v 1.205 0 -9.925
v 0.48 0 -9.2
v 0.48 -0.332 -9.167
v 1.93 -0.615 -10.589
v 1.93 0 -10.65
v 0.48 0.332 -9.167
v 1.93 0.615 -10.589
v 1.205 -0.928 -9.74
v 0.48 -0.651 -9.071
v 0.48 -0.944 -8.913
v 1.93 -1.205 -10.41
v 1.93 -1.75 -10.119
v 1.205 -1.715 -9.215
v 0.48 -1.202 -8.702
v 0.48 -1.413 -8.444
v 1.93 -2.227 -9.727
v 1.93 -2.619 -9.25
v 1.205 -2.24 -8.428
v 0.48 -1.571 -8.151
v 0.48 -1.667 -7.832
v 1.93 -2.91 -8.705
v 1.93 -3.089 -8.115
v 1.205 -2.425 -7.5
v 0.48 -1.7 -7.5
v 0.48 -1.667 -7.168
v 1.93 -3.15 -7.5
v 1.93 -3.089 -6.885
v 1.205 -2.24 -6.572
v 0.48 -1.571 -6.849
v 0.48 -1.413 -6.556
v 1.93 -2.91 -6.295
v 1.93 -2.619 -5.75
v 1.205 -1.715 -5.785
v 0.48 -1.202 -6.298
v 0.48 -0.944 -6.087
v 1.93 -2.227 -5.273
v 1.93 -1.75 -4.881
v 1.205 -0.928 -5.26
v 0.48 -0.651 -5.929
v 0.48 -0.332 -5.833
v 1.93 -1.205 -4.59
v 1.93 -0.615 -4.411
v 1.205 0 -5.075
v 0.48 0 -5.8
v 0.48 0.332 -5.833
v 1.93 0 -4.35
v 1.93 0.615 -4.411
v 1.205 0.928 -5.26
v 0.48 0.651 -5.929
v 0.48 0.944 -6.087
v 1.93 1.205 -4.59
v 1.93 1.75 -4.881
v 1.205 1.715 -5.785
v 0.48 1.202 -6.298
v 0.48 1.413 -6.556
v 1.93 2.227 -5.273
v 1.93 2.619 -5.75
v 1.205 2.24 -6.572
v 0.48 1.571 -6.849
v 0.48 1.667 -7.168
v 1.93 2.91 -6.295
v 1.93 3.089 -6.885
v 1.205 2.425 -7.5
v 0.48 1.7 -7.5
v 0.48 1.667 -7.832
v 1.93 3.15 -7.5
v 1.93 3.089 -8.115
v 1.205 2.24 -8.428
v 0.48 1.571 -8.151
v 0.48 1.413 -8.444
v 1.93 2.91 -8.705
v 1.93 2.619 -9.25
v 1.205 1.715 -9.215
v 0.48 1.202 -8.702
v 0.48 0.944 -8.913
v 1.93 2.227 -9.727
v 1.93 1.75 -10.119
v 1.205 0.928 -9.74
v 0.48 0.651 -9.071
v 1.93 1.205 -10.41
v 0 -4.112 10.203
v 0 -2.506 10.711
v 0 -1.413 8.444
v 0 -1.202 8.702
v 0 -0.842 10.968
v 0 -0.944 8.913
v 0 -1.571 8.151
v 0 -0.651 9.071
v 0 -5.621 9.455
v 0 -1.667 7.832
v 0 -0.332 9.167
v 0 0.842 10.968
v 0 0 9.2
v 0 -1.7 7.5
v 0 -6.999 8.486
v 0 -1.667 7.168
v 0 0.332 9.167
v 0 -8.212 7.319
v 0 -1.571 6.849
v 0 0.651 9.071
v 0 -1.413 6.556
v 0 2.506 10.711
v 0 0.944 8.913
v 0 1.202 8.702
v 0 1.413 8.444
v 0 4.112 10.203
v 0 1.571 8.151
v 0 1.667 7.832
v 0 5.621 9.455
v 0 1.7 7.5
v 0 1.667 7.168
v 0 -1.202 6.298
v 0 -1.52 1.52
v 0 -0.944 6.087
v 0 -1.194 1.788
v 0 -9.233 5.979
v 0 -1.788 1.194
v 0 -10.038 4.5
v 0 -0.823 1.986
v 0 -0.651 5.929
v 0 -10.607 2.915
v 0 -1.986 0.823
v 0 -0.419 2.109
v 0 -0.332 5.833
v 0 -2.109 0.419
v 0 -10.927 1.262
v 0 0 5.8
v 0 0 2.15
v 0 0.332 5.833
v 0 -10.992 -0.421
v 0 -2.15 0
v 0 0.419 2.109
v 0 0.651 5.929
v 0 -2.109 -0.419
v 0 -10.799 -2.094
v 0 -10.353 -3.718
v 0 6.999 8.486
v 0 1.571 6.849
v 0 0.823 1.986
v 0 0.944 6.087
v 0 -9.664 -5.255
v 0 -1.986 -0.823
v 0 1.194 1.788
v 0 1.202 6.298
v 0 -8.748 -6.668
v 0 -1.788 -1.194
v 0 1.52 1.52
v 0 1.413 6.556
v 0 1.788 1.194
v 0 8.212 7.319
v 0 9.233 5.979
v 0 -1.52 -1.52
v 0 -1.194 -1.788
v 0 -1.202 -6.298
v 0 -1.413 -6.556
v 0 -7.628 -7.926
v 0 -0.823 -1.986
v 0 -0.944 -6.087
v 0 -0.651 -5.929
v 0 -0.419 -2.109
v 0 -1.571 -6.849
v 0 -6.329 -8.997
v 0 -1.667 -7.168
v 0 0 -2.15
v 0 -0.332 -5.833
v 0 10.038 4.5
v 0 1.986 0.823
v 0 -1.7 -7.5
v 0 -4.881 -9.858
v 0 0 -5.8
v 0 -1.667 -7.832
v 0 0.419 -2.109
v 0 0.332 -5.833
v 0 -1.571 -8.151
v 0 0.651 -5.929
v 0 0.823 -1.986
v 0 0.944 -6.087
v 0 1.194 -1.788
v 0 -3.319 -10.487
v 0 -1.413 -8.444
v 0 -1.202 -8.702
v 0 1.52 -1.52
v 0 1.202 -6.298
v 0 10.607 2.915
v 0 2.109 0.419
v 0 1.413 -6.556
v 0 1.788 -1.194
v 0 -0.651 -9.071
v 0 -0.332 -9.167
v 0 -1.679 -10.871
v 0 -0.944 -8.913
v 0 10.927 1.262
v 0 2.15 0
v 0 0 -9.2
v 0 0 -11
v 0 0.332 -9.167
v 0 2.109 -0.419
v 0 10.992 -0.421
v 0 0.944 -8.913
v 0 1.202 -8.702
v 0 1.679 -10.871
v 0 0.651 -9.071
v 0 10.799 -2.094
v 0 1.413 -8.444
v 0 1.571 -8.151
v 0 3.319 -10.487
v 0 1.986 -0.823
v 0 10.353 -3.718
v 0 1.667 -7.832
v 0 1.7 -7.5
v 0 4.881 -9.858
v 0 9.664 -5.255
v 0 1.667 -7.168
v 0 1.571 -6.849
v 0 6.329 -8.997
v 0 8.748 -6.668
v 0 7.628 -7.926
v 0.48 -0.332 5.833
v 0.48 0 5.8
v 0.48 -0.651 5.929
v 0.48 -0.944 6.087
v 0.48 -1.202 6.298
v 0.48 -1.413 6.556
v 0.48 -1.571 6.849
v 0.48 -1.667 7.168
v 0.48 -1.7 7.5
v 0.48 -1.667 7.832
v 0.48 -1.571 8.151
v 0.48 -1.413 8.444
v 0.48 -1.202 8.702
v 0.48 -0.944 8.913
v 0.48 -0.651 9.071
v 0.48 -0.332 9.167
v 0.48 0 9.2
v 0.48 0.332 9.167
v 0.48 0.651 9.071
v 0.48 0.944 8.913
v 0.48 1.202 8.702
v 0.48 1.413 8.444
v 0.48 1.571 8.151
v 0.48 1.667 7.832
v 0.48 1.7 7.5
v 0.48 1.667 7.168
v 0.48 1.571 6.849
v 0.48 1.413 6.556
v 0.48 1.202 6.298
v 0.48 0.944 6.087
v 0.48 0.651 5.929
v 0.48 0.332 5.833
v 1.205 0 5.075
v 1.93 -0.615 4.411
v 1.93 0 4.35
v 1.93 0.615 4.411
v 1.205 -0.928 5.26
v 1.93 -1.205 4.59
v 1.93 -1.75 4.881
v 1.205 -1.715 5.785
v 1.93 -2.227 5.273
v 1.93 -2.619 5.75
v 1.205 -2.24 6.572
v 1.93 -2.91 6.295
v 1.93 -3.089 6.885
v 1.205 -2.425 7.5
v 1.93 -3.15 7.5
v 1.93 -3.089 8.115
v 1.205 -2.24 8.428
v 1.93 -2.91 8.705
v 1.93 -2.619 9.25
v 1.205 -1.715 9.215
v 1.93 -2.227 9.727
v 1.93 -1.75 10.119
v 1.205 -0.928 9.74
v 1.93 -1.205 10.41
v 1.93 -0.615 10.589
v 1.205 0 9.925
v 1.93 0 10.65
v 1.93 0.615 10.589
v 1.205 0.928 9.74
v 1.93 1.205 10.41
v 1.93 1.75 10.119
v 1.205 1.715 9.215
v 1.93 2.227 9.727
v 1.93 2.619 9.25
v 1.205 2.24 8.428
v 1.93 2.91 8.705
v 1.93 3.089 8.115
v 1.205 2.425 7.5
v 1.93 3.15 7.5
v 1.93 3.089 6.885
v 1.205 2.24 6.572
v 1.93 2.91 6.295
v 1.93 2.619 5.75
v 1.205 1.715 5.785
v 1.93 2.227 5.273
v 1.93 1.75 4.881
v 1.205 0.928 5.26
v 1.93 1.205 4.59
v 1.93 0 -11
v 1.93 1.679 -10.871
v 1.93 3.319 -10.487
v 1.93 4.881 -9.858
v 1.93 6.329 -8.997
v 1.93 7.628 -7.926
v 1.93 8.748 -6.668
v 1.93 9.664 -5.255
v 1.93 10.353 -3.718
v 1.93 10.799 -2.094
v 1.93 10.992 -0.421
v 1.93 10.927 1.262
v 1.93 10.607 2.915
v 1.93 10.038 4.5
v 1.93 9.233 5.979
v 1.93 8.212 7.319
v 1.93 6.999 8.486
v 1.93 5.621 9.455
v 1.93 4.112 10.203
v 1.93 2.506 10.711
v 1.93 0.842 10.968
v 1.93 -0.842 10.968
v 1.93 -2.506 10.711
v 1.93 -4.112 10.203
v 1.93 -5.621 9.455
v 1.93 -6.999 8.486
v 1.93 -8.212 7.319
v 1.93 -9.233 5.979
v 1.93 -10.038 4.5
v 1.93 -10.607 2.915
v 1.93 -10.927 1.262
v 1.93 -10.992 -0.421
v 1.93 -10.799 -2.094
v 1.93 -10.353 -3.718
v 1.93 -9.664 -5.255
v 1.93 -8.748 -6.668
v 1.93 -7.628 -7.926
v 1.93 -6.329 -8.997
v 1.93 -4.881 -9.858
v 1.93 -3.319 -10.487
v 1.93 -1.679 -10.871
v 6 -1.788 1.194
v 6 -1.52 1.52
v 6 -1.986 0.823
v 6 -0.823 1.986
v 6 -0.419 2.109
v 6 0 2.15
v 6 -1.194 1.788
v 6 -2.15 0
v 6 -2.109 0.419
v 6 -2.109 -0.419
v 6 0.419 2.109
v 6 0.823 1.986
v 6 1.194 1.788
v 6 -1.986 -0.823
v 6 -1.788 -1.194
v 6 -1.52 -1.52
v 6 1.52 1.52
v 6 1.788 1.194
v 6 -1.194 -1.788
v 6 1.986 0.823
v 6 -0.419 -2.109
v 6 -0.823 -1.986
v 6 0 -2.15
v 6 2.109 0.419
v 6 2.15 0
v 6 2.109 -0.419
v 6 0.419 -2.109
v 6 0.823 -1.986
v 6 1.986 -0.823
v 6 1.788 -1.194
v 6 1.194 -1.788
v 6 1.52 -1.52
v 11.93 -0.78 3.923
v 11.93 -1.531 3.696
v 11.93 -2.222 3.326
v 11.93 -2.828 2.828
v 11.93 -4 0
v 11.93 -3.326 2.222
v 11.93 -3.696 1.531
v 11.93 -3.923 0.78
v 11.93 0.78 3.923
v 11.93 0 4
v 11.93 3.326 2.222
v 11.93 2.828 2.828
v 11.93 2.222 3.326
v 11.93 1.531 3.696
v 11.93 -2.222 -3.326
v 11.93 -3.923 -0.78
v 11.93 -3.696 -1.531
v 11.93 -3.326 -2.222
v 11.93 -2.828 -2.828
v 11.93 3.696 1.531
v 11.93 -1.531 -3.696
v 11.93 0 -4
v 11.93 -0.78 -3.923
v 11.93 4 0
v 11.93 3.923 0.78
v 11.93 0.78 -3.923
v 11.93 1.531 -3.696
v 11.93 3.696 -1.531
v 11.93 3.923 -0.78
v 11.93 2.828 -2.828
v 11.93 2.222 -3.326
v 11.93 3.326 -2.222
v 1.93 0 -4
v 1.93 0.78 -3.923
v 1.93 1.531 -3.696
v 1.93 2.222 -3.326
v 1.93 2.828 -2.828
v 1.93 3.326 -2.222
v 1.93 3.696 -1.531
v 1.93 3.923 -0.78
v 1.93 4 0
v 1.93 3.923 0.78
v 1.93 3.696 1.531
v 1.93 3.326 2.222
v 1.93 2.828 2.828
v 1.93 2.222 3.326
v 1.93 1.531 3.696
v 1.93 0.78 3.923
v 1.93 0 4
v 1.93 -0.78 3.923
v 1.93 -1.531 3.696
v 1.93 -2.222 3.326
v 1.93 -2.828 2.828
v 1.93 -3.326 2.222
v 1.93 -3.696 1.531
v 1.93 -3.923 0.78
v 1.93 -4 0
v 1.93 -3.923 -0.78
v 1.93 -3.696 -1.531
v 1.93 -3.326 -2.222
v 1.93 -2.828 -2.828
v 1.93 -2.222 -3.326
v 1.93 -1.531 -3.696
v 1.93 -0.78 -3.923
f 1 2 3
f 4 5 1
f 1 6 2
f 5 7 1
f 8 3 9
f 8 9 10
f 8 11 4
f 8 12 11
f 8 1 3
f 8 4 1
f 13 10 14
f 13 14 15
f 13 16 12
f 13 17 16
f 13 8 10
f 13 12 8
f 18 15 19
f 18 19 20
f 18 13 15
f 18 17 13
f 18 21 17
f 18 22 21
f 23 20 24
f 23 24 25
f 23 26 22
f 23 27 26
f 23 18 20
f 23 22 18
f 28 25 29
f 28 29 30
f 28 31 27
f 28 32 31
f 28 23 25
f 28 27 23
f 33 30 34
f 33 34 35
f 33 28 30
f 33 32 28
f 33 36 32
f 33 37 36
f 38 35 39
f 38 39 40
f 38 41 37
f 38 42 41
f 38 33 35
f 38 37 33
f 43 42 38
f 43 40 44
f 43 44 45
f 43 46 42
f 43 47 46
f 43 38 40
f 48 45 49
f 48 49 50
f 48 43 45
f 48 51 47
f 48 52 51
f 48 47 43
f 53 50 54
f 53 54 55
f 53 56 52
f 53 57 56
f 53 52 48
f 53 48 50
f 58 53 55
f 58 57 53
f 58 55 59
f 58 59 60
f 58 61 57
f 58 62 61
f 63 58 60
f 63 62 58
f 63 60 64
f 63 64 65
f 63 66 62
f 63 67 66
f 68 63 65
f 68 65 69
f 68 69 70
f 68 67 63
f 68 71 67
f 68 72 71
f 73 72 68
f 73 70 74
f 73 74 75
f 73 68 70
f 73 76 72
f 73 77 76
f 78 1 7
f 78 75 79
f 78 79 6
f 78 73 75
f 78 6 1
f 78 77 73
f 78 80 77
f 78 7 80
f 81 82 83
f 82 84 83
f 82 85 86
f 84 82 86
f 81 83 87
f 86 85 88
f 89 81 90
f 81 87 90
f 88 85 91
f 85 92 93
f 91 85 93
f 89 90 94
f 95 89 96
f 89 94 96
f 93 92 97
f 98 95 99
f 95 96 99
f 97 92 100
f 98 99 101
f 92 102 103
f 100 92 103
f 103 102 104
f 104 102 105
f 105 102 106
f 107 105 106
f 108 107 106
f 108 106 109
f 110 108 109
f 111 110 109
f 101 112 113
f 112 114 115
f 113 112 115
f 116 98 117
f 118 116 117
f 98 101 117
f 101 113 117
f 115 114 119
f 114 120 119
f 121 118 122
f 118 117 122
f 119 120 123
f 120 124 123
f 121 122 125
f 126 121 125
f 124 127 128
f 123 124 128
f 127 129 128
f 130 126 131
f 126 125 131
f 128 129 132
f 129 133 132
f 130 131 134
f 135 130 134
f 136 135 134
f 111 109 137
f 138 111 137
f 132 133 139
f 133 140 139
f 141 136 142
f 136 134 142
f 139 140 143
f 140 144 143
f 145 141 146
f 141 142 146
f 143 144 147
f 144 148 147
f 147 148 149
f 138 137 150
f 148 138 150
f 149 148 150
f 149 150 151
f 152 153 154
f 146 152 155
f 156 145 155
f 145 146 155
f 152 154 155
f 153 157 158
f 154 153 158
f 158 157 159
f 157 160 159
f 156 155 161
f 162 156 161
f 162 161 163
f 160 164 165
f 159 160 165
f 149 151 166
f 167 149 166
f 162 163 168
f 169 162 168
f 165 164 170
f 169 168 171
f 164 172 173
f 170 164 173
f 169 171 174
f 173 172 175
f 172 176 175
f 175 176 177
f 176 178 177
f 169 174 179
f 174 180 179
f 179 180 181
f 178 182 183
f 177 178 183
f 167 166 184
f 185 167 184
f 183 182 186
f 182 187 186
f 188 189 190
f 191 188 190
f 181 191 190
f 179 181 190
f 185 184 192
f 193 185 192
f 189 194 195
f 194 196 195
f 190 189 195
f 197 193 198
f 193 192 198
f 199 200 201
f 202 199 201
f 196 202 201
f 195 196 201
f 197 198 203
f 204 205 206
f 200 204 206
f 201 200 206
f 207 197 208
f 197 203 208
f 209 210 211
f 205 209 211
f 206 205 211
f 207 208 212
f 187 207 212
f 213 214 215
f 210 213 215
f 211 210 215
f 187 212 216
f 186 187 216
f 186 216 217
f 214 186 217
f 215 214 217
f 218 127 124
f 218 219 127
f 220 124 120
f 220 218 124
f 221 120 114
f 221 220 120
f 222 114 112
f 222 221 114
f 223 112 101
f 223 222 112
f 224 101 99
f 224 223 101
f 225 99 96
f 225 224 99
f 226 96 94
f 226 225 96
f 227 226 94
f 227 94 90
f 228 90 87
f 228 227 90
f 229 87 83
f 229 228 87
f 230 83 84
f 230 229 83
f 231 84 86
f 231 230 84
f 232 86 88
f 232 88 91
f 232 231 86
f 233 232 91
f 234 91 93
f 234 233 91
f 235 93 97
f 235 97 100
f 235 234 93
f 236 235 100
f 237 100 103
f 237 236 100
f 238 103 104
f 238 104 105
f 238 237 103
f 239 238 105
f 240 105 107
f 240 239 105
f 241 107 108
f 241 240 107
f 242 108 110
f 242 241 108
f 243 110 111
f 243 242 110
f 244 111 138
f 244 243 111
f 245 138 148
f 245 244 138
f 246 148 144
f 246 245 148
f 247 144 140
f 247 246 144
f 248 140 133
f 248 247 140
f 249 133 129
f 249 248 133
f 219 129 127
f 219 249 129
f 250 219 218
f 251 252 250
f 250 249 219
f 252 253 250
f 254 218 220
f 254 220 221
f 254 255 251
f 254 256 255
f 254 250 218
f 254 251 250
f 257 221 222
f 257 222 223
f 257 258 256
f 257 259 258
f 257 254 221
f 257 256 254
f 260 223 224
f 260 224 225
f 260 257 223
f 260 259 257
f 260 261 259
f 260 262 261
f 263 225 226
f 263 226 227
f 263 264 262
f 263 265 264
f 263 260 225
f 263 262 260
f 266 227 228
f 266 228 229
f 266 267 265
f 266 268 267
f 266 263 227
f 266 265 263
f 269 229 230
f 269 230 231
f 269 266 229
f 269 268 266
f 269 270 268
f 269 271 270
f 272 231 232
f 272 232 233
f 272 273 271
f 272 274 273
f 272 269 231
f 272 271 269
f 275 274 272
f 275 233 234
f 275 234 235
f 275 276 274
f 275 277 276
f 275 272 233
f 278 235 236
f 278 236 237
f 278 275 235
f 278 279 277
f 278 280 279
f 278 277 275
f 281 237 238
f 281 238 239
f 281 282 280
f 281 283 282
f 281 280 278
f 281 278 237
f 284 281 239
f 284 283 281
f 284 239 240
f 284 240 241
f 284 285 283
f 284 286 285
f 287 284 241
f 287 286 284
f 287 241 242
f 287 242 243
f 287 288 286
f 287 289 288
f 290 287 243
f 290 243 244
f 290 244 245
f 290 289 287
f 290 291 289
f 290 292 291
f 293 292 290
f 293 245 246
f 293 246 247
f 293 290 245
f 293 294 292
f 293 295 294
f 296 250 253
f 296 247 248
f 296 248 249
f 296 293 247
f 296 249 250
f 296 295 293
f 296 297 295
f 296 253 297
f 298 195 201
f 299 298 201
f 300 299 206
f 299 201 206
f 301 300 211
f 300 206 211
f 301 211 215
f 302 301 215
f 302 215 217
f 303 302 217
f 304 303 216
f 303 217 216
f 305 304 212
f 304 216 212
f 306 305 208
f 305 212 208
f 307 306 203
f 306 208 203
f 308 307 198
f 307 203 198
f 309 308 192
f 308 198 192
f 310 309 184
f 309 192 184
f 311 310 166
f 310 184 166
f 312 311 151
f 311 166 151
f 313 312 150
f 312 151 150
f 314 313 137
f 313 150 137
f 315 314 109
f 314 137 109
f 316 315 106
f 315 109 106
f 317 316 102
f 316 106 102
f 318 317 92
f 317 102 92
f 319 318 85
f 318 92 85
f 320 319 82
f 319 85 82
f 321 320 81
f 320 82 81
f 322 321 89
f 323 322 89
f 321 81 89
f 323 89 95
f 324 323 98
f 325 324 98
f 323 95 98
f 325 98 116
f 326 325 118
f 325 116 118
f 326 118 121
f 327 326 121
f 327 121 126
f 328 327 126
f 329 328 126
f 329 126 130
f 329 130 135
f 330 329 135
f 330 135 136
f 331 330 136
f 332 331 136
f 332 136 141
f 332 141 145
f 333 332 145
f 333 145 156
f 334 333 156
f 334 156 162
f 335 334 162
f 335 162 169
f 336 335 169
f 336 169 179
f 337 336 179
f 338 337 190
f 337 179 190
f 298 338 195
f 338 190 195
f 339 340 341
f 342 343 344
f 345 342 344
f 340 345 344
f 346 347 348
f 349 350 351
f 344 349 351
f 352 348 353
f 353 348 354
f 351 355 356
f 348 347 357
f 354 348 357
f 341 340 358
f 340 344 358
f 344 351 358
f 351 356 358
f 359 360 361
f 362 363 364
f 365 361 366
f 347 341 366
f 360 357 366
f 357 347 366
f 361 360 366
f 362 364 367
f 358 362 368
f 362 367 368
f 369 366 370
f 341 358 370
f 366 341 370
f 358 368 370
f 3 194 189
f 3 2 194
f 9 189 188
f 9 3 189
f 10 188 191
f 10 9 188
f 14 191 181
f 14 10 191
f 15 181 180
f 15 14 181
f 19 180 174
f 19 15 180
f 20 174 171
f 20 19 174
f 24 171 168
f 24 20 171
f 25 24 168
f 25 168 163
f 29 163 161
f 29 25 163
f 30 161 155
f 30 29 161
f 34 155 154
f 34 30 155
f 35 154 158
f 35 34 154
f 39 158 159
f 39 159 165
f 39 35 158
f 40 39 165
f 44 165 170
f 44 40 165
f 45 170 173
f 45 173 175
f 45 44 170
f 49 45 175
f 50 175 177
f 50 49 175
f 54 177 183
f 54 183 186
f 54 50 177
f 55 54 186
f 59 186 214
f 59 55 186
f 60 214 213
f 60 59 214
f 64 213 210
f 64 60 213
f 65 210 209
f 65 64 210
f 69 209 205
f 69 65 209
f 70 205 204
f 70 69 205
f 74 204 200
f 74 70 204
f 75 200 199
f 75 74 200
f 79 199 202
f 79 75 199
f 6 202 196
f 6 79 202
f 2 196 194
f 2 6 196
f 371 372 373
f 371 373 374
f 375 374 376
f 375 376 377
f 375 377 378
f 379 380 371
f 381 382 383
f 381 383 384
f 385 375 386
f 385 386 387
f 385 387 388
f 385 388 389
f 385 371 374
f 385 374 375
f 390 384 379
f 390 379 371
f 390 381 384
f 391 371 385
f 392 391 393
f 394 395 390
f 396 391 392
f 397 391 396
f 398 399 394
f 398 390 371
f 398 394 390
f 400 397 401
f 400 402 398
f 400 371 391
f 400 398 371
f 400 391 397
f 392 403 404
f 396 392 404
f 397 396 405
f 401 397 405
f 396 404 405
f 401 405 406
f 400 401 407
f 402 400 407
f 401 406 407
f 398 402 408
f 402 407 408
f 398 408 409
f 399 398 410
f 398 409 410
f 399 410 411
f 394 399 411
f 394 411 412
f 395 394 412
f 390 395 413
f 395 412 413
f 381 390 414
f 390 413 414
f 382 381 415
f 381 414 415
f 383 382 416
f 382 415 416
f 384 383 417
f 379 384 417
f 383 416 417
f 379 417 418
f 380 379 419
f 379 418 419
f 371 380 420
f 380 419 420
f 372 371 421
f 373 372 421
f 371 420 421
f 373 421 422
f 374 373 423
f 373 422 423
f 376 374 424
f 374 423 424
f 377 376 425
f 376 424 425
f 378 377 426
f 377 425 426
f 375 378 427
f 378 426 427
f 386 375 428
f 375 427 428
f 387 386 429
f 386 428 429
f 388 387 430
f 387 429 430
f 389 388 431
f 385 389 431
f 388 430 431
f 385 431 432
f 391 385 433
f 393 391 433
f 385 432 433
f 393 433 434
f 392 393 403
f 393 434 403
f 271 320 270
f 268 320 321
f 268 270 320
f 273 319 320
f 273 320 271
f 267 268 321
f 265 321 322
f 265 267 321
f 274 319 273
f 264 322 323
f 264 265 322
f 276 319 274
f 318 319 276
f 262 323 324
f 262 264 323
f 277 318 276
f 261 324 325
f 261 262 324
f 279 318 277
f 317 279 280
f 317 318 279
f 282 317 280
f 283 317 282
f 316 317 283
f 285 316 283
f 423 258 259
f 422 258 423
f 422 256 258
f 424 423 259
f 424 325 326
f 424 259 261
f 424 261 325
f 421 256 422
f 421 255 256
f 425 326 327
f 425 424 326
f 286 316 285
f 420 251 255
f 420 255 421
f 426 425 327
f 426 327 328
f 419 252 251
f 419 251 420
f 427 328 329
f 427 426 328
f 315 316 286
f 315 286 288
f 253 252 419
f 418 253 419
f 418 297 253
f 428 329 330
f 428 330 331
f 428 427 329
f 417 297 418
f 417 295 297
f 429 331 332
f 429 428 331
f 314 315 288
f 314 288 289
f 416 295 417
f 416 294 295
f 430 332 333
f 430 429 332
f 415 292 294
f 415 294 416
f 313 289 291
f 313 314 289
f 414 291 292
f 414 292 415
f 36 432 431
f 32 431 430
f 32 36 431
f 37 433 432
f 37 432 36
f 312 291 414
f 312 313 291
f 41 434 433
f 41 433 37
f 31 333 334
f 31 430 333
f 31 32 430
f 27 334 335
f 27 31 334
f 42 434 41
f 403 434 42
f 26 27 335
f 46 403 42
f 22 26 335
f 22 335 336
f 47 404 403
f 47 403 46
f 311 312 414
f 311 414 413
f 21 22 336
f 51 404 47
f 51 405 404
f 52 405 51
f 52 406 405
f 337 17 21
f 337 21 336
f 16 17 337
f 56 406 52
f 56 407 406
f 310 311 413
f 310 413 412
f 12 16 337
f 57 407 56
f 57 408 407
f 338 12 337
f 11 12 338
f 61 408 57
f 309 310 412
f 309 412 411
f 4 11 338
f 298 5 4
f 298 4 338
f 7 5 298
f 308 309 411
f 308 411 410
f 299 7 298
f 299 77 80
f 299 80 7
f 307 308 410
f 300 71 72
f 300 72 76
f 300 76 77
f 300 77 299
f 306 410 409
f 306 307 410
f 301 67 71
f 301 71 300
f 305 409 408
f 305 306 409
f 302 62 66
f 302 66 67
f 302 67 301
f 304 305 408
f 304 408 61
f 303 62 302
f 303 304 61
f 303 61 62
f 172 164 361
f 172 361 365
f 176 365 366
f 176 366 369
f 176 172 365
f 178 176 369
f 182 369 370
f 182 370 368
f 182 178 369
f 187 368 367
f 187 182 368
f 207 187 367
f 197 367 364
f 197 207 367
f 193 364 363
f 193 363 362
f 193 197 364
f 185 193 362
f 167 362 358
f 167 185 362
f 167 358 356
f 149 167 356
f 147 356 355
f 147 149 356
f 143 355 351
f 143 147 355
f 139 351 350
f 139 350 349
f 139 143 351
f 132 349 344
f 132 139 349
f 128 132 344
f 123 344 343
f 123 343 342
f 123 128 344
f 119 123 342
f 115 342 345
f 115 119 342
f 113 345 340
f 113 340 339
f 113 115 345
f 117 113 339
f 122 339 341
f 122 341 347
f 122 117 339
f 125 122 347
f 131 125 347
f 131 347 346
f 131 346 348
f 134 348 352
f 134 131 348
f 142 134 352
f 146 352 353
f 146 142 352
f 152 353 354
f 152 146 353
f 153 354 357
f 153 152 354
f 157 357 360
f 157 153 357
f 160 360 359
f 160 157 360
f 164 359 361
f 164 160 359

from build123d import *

# Parameters (mm, degrees)
SKETCH1_R                                      = 11
SKETCH1_R_2                                    = 1.6
BOSS_EXTRUDE1_DEPTH                            = 1.93
SKETCH2_R                                      = 4
BOSS_EXTRUDE2_DEPTH                            = 10
SKETCH3_R                                      = 2.15
CUT_EXTRUDE1_DEPTH                             = 6
CSK_FOR_M3_FLAT_HEAD_MACHINE_SCREW1_AT_2_COUNT = 2
CSK_FOR_M3_FLAT_HEAD_MACHINE_SCREW1_AT_2_PITCH = 15


with BuildPart() as part:
    # Sketch1 → Boss-Extrude1 (new body)
    with BuildSketch(Plane(origin=(0, 0, 0), x_dir=(0, 0, -1), z_dir=(1, 0, 0))):
        Circle(SKETCH1_R)
        with Locations((7.5, 0)):
            Circle(SKETCH1_R_2, mode=Mode.SUBTRACT)
        with Locations((-7.5, 0)):
            Circle(SKETCH1_R_2, mode=Mode.SUBTRACT)
    extrude(amount=BOSS_EXTRUDE1_DEPTH)

    # Sketch2 → Boss-Extrude2 (add)
    with BuildSketch(Plane(origin=(1.93, 0, 0), x_dir=(0, 0, -1), z_dir=(1, 0, 0))):
        Circle(SKETCH2_R)
    extrude(amount=BOSS_EXTRUDE2_DEPTH)

    # Sketch3 → Cut-Extrude1 (cut)
    with BuildSketch(Plane(origin=(0, 0, 0), x_dir=(0, 0, -1), z_dir=(1, 0, 0))):
        Circle(SKETCH3_R)
    extrude(amount=CUT_EXTRUDE1_DEPTH, mode=Mode.SUBTRACT)

    # Sketch5 → CSK for M3 Flat Head Machine Screw1 (revolve, cut)
    with BuildSketch(Plane(origin=(1.93, 0, 7.5), x_dir=(0, 0, -1), z_dir=(0, 1, 0))):
        Polygon((0, 0), (0, 1.93), (1.7, 1.93), (1.7, 1.45), (3.15, 0), align=None)
    csk_for_m3_flat_head_machine_screw1 = revolve(axis=Axis((8.28, 0, 7.5), (-1, 0, 0)), mode=Mode.SUBTRACT)

    # CSK for M3 Flat Head Machine Screw1 at 2: CSK for M3 Flat Head Machine Screw1 ×2
    with Locations(*[(0, 0, -i * CSK_FOR_M3_FLAT_HEAD_MACHINE_SCREW1_AT_2_PITCH) for i in range(1, CSK_FOR_M3_FLAT_HEAD_MACHINE_SCREW1_AT_2_COUNT)]):
        add(csk_for_m3_flat_head_machine_screw1, mode=Mode.SUBTRACT)


solid = part.part
